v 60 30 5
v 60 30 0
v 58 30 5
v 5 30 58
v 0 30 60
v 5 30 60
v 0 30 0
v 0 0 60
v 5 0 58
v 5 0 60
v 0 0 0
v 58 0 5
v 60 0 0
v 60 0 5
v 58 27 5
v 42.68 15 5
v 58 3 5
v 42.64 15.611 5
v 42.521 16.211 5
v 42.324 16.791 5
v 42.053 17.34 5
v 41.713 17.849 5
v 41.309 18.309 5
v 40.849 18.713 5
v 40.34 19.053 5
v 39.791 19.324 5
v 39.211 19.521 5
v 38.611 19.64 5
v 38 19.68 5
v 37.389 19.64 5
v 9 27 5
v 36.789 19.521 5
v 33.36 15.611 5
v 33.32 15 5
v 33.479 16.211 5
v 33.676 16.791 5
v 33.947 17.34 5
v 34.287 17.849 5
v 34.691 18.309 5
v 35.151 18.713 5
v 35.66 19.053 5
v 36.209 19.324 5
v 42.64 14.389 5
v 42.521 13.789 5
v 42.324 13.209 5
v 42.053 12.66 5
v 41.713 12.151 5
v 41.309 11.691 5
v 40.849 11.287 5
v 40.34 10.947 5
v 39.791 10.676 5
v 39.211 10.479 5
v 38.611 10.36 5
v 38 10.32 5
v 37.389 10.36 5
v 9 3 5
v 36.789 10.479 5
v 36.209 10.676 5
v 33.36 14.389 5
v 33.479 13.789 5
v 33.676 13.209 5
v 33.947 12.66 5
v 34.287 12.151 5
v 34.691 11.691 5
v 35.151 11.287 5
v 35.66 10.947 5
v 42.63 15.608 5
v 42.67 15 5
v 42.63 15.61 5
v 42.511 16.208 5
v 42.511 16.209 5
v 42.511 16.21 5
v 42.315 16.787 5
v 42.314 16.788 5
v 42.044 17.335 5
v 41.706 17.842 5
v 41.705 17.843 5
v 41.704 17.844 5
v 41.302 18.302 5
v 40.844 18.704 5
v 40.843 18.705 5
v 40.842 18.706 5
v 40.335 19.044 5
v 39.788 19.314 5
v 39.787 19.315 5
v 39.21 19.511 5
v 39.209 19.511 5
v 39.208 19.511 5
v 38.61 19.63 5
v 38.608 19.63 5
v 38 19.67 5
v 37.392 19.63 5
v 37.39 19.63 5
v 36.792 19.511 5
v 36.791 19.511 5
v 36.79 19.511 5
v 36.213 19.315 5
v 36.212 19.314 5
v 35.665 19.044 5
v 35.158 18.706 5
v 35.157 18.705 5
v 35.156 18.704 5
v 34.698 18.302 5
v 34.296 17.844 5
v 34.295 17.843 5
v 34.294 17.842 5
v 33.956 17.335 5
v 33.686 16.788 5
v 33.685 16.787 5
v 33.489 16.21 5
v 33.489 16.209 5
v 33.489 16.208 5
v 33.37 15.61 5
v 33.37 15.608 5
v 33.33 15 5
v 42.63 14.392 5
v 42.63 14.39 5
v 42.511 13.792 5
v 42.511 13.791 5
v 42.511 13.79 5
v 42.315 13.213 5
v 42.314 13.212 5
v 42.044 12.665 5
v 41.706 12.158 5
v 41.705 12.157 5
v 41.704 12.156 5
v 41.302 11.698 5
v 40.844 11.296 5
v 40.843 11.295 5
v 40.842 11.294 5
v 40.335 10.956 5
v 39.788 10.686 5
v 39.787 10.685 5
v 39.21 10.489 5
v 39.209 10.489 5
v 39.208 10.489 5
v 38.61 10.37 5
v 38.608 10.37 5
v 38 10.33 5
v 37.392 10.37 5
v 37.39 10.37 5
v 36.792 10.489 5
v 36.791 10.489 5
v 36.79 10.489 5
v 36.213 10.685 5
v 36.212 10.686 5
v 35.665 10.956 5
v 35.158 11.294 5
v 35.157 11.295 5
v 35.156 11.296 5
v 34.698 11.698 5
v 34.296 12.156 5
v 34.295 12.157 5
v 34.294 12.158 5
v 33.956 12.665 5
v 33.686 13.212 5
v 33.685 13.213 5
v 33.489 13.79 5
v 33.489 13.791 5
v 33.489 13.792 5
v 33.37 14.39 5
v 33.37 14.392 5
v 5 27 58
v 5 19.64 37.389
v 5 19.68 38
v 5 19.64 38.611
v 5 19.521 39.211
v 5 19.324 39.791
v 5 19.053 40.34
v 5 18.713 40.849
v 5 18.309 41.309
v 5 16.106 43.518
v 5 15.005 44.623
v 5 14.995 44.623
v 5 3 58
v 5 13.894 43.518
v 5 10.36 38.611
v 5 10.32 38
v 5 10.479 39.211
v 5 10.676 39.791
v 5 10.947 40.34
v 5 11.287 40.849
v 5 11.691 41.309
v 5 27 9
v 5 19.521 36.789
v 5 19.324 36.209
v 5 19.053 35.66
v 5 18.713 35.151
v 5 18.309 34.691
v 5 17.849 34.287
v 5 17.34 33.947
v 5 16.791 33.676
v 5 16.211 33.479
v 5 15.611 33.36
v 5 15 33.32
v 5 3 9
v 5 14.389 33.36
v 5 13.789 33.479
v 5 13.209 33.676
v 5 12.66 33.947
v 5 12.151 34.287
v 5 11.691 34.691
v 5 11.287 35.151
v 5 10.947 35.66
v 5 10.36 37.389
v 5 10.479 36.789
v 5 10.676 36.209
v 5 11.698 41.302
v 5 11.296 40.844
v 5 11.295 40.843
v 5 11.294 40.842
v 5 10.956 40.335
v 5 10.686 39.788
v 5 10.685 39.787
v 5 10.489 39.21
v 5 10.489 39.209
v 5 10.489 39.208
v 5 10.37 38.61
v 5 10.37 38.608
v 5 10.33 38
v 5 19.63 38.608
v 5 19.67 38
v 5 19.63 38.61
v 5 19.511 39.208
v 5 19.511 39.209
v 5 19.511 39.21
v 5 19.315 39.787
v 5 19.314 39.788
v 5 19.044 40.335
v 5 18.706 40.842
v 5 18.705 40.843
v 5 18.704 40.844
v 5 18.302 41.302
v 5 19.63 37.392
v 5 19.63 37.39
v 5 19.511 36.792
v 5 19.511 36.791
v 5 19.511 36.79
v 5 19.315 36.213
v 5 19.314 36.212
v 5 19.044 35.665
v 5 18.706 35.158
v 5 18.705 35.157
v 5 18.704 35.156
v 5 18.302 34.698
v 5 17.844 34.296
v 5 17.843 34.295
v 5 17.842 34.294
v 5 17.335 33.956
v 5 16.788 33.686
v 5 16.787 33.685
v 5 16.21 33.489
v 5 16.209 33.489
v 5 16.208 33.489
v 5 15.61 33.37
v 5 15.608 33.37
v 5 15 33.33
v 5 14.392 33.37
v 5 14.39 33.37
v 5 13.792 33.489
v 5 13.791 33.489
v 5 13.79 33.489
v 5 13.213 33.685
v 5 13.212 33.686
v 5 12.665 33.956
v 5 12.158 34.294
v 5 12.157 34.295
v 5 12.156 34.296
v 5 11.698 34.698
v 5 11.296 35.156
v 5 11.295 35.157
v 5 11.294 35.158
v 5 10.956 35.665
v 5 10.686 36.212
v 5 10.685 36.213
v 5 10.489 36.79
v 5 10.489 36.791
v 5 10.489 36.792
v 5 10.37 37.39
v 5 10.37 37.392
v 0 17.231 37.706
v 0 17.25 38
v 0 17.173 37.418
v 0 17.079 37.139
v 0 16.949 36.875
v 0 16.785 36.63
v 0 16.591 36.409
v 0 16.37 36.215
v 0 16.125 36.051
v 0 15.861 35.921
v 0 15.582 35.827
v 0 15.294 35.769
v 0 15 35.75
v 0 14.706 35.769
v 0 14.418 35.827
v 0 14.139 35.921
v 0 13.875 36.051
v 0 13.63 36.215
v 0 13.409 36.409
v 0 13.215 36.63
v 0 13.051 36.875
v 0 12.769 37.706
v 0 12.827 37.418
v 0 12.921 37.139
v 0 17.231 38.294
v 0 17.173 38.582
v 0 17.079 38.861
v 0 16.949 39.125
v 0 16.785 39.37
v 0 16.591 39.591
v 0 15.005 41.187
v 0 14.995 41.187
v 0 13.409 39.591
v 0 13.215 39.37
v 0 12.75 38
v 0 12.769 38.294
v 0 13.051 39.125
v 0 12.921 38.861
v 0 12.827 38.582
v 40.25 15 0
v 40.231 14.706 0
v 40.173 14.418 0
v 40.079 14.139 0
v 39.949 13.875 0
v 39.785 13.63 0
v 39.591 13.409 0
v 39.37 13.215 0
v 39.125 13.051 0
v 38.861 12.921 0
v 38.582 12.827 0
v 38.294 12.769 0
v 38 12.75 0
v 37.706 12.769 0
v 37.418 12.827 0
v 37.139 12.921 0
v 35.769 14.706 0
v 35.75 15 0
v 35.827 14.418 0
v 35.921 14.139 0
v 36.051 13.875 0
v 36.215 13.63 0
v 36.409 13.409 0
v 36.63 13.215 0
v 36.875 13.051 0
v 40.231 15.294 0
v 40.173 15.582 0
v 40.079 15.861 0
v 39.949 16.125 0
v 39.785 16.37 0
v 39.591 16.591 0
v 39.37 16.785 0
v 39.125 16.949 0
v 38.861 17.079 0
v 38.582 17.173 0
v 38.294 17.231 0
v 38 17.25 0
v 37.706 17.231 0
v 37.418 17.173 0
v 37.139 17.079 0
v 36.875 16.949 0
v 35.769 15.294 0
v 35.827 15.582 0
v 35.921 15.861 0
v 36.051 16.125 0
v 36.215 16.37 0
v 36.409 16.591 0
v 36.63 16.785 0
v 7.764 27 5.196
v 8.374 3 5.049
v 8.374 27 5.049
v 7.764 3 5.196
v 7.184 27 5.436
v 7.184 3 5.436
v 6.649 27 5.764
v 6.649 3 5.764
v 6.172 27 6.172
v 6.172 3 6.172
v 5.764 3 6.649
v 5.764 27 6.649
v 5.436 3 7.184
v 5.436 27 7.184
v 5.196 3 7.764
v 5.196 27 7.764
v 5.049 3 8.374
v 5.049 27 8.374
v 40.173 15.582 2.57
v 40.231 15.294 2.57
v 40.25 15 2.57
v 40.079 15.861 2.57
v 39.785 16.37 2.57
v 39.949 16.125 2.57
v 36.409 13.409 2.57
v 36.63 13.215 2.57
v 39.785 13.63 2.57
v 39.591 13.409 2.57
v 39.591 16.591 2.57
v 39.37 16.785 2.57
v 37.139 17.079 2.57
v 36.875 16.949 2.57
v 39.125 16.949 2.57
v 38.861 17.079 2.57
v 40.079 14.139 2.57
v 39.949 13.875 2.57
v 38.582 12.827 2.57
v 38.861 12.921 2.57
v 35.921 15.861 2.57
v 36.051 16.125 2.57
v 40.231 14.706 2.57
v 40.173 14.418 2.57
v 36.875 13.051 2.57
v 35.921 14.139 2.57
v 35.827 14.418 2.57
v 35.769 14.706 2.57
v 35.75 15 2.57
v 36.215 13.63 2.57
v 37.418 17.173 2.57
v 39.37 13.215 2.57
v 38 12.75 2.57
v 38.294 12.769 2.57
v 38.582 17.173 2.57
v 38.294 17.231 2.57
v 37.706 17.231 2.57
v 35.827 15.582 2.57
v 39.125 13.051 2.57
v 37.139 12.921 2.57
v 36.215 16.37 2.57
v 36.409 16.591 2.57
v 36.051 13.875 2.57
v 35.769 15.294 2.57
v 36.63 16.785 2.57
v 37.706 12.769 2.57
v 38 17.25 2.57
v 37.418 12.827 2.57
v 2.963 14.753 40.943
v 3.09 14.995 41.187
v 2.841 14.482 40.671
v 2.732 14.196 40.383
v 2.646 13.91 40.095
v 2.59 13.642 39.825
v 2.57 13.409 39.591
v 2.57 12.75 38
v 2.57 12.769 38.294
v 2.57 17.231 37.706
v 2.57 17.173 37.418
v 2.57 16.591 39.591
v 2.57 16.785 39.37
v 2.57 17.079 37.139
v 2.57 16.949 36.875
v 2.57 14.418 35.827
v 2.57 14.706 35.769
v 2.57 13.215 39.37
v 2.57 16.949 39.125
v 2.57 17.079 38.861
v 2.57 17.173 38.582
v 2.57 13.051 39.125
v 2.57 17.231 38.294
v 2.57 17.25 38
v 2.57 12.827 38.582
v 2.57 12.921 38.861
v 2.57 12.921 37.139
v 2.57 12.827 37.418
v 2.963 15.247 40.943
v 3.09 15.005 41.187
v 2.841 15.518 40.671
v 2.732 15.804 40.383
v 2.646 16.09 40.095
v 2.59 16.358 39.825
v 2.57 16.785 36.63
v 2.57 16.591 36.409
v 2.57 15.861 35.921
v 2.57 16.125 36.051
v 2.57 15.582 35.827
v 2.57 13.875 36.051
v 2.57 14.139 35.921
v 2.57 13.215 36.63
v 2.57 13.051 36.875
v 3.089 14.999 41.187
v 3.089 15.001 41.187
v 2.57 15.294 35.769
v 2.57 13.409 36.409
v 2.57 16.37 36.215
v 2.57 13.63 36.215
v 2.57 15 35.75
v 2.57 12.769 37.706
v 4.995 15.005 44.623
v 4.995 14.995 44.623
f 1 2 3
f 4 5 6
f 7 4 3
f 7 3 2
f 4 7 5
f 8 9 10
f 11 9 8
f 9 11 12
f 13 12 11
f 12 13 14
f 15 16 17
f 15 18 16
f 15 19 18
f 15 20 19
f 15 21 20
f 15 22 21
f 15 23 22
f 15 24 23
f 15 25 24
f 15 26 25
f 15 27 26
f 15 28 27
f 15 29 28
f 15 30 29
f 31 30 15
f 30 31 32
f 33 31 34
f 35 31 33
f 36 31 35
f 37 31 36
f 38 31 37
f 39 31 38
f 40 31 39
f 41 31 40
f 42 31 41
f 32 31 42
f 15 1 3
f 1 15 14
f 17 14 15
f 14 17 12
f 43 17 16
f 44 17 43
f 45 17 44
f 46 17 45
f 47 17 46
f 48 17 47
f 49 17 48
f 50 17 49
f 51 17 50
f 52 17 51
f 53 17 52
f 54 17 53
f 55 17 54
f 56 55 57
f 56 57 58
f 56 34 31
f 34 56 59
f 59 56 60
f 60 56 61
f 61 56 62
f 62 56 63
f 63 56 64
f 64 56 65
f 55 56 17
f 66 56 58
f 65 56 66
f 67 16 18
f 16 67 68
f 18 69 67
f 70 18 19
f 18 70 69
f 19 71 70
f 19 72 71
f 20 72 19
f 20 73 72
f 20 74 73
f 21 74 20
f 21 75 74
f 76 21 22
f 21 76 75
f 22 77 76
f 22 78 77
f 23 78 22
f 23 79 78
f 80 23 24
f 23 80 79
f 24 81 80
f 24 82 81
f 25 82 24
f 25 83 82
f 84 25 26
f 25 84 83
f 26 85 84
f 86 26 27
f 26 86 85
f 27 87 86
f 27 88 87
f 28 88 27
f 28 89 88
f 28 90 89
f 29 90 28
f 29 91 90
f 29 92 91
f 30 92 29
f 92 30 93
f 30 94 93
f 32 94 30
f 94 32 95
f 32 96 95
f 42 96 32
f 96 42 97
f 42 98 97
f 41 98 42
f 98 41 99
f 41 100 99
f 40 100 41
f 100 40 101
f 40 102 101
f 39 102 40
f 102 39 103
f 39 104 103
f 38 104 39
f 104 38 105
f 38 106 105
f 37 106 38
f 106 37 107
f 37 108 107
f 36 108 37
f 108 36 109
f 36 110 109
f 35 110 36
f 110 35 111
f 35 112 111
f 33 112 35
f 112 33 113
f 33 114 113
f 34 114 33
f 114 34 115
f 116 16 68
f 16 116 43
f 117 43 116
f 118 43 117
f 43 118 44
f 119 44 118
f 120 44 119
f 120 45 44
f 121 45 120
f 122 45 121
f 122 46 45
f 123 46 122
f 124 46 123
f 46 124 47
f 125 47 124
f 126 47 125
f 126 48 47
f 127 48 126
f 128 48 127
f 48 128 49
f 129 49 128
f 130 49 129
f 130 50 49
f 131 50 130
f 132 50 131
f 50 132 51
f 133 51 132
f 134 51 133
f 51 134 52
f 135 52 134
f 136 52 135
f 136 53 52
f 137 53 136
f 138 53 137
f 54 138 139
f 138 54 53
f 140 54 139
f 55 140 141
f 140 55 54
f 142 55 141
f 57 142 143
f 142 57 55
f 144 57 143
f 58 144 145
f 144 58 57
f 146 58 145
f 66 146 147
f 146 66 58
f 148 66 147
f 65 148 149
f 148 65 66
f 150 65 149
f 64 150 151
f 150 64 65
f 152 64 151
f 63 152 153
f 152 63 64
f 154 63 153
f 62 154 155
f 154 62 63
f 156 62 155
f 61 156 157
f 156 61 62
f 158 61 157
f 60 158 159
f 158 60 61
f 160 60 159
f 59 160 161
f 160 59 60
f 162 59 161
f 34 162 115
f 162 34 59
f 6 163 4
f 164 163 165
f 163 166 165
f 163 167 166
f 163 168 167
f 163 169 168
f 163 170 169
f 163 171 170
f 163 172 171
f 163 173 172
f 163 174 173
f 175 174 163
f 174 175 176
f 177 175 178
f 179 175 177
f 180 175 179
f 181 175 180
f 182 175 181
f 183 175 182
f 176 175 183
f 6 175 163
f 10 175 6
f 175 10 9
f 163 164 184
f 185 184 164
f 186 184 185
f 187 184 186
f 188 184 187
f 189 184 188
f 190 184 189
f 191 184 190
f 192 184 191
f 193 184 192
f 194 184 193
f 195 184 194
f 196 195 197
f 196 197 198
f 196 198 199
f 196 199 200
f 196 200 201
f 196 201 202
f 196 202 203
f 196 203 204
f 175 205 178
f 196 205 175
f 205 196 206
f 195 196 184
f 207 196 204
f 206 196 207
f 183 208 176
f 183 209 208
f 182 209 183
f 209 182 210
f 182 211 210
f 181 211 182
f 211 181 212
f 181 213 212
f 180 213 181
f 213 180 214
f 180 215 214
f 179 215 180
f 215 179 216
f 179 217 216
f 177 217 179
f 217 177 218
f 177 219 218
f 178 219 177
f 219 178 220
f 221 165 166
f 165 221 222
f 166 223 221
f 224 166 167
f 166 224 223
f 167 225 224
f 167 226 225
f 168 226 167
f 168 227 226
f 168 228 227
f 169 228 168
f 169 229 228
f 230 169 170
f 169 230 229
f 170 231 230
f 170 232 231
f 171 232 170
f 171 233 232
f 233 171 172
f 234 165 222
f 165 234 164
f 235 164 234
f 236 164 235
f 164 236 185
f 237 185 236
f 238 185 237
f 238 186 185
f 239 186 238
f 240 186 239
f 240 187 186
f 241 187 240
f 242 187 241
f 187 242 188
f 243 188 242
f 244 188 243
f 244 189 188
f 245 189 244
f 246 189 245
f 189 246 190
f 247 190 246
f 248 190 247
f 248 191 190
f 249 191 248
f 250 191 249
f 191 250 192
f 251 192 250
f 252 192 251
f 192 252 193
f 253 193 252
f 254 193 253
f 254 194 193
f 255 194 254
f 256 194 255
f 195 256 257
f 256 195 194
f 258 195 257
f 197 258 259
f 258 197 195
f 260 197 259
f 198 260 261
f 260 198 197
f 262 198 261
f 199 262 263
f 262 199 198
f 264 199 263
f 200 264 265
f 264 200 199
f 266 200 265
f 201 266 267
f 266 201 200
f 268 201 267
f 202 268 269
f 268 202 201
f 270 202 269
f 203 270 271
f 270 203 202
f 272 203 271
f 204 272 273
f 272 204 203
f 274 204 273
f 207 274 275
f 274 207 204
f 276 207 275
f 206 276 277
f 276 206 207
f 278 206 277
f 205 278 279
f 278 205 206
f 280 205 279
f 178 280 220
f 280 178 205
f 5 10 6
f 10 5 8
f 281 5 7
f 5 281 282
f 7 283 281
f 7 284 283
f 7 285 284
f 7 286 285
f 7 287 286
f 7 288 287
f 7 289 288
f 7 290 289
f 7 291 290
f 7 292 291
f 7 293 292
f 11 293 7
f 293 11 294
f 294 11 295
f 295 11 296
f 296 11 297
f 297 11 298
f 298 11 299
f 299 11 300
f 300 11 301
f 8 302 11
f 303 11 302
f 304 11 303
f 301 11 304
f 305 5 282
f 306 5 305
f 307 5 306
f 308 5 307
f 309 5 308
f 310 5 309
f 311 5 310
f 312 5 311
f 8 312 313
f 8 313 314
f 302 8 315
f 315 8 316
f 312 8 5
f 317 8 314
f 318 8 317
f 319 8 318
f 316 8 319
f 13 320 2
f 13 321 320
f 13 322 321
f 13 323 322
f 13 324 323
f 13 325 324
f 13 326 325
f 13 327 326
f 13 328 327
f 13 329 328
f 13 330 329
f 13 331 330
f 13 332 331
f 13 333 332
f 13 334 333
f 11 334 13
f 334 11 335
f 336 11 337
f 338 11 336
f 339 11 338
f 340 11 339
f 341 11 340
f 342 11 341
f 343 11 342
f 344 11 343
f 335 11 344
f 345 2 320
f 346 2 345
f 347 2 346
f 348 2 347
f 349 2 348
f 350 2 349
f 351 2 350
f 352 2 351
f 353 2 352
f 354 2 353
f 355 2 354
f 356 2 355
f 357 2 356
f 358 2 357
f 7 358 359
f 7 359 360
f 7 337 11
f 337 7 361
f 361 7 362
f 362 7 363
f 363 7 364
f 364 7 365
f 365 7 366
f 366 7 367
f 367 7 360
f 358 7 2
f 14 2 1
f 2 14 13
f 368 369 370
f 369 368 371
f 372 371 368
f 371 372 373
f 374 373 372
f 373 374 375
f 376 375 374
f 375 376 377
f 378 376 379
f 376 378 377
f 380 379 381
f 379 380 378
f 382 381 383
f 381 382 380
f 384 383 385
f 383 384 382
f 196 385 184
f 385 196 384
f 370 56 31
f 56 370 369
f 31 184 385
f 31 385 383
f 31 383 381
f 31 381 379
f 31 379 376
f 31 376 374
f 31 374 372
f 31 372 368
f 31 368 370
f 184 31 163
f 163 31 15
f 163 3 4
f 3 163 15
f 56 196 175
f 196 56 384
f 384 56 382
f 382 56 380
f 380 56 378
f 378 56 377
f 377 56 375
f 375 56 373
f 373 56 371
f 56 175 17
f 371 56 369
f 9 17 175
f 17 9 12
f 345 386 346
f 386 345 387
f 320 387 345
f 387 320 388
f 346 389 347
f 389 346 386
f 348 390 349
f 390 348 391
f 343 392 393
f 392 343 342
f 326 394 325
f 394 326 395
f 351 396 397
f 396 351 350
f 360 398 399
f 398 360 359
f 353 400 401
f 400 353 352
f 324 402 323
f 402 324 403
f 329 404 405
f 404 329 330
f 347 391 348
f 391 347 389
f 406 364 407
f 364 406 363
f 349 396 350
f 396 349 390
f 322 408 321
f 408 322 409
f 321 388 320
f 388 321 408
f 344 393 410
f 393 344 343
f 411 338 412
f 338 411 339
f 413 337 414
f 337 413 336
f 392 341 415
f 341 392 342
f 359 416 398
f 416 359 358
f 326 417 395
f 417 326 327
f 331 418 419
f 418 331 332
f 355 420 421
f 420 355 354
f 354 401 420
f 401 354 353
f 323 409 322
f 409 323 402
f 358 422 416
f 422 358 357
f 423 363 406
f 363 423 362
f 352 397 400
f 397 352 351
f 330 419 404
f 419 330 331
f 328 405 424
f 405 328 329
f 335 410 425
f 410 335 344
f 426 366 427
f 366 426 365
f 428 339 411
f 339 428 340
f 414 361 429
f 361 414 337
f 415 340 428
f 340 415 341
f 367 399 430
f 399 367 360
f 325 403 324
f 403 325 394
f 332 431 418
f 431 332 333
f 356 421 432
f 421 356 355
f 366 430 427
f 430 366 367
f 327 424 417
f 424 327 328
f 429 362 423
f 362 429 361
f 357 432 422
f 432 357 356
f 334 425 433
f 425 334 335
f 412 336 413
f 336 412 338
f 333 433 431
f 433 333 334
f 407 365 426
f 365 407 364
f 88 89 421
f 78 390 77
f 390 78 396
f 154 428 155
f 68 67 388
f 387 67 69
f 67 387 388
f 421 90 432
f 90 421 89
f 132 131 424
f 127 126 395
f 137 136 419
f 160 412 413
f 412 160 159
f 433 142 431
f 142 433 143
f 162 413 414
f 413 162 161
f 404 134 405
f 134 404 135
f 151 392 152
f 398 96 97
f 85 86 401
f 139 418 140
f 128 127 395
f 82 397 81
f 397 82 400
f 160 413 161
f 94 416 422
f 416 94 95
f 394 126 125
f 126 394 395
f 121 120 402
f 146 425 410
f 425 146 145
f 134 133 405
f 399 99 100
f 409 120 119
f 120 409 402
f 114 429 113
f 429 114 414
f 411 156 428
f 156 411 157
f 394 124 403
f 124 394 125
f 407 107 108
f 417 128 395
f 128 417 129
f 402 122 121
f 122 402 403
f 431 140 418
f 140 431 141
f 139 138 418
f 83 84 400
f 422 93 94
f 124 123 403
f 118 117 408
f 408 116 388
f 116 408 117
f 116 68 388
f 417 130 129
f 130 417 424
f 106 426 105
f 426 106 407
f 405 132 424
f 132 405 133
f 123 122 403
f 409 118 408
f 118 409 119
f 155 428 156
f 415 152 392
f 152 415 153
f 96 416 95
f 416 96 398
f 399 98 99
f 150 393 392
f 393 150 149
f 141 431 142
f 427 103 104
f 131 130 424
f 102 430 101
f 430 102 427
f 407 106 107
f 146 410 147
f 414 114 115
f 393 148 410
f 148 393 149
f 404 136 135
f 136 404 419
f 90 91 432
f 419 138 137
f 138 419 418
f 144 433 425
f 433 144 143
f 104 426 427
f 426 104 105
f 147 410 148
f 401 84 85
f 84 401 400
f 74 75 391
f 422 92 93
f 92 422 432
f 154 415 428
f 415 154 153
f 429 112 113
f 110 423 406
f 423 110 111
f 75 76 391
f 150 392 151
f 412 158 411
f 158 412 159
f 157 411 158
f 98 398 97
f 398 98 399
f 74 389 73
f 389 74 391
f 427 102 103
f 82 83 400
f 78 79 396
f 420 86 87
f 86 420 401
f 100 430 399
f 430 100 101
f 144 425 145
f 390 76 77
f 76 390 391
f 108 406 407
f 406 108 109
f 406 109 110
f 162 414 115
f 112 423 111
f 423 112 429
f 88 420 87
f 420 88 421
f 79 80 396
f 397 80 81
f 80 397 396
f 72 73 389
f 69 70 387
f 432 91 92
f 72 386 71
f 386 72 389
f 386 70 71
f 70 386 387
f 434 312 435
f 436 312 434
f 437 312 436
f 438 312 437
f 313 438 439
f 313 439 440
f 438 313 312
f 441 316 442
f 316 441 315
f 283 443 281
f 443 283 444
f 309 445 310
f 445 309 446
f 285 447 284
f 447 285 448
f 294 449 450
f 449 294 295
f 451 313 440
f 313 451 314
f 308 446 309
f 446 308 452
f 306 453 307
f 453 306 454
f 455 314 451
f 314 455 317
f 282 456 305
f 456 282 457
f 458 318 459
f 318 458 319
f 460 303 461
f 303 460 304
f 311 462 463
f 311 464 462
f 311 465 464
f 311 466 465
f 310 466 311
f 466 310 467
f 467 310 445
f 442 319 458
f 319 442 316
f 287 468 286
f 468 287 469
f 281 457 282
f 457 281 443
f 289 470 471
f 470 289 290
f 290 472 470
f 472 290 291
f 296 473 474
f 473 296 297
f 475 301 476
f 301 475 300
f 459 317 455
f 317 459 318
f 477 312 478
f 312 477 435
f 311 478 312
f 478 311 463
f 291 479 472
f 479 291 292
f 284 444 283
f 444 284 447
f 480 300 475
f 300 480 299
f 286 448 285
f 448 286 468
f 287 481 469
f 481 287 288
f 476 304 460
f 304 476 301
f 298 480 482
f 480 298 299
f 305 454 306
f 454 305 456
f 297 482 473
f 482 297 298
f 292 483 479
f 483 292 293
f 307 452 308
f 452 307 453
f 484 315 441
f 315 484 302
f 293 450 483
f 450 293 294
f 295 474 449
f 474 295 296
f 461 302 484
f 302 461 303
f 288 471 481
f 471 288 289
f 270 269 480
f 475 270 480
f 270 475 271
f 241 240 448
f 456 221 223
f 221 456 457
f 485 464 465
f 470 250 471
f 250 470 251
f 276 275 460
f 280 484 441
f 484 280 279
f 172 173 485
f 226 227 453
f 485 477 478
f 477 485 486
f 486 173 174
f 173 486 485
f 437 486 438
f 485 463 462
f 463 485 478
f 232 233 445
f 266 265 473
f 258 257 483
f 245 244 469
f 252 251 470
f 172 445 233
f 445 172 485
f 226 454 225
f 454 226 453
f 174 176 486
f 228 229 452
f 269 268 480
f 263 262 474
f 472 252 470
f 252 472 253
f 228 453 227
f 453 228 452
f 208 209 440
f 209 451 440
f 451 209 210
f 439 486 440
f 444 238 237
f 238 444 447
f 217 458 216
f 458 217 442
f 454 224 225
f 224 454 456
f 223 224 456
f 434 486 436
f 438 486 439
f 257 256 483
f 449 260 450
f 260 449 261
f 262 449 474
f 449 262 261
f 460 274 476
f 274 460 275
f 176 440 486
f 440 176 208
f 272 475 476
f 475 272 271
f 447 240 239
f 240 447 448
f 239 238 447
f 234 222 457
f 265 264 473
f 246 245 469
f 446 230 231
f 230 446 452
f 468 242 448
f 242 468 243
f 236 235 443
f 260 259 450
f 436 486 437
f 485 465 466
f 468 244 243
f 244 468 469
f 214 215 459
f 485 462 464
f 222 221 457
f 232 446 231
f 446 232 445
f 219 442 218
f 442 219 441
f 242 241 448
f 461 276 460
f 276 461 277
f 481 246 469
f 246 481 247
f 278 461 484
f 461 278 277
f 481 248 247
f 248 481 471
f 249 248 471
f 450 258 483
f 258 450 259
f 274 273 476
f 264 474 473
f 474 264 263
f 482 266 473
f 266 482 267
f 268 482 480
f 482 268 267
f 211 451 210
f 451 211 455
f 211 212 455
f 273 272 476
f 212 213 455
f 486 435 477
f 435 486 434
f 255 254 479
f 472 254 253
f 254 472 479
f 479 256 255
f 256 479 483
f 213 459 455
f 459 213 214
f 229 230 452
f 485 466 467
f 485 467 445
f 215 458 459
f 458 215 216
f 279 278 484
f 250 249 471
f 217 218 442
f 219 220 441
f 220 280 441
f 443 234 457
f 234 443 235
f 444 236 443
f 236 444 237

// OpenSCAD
// Parametric Corner Bracket with side gussets - original design (Brian Sacco)
// Output is in PRINT orientation: standing on the horizontal arm, gussets as vertical walls,
// so it prints without supports (verified with PrusaSlicer). Inner corner fillet adds strength.
arm       = 60;    // arm length from the outer corner (mm)
width     = 30;    // bracket width (mm)
t         = 5;     // plate thickness (mm)
gusset_t  = 3;     // thickness of each side gusset
screw     = 4;     // metric screw size: 3, 4 or 5
holes     = 1;     // screw holes per arm: 1 or 2
$fn = 48;

clear = screw == 3 ? 3.4 : screw == 4 ? 4.5 : 5.5;   // clearance hole
// ISO 10642 max head diameter dk (M3 6.72 / M4 8.96 / M5 11.20) + 0.4 mm so the head sits flush.
// Clearance holes per ISO 273 medium (3.4 / 4.5 / 5.5). Also fits 4 and 5 mm wood screws (DIN 7997 heads <= 10 mm).
head  = (screw == 3 ? 6.72 : screw == 4 ? 8.96 : 11.20) + 0.4;  // countersink diameter at the surface
g_len = arm - 2;                                     // gusset leg length

// hole positions measured from the outer corner, kept clear of the inner corner
function hole_pos(i) = holes == 1 ? t + (arm - t) * 0.6
                                  : t + (arm - t) * (i == 0 ? 0.38 : 0.78);

module profile() {                 // the L seen from the side
    square([arm, t]);              // horizontal arm (outer face at y = 0)
    square([t, arm]);              // vertical arm   (outer face at x = 0)
}
module fillet(r = 4) {           // rounded inner corner (less stress concentration)
    translate([t, t]) difference() { square(r); translate([r, r]) circle(r=r, $fn=40); }
}
module gusset() { polygon([[t, t], [g_len, t], [t, g_len]]); }

module tear2d(dd) { hull() { circle(d=dd); translate([0, dd/2*1.414]) square(0.01, center=true); } }
// Same countersunk hole with a pointed (teardrop) top, for holes whose axis is horizontal when printed:
// the pointed roof is self-supporting. The point faces local +Y (= up in print orientation).
module countersunk_tear(len) {
    translate([0, 0, -1]) linear_extrude(len + 2) tear2d(clear);
    hull() {
        translate([0, 0, len - (head - clear) / 2]) cylinder(d1=clear, d2=head, h=(head - clear) / 2 + 0.01);
        translate([0, head/2*1.414, len]) cube(0.01, center=true);
    }
    translate([0, 0, len]) linear_extrude(1) tear2d(head);
}
module countersunk(len) {          // axis along +Z, head at z = len
    translate([0, 0, -1]) cylinder(d = clear, h = len + 2);
    translate([0, 0, len - (head - clear) / 2]) cylinder(d1 = clear, d2 = head, h = (head - clear) / 2 + 0.01);
    translate([0, 0, len]) cylinder(d = head, h = 1);
}

rotate([90, 0, 0]) translate([0, 0, -width]) difference() {
    union() {
        linear_extrude(width) profile();
        linear_extrude(width) fillet();
        linear_extrude(gusset_t) gusset();                       // bottom gusset (bed side)
        translate([0, 0, width - gusset_t]) linear_extrude(gusset_t) gusset();  // top gusset
    }
    for (i = [0 : holes - 1]) {
        // horizontal arm: hole along Y, countersink on the inner face (y = t)
        translate([hole_pos(i), 0, width / 2]) rotate([-90, 0, 0]) countersunk(t);
        // vertical arm: hole along X, countersink on the inner face (x = t)
        translate([0, hole_pos(i), width / 2]) rotate([0, 90, 0]) countersunk_tear(t);
    }
}
